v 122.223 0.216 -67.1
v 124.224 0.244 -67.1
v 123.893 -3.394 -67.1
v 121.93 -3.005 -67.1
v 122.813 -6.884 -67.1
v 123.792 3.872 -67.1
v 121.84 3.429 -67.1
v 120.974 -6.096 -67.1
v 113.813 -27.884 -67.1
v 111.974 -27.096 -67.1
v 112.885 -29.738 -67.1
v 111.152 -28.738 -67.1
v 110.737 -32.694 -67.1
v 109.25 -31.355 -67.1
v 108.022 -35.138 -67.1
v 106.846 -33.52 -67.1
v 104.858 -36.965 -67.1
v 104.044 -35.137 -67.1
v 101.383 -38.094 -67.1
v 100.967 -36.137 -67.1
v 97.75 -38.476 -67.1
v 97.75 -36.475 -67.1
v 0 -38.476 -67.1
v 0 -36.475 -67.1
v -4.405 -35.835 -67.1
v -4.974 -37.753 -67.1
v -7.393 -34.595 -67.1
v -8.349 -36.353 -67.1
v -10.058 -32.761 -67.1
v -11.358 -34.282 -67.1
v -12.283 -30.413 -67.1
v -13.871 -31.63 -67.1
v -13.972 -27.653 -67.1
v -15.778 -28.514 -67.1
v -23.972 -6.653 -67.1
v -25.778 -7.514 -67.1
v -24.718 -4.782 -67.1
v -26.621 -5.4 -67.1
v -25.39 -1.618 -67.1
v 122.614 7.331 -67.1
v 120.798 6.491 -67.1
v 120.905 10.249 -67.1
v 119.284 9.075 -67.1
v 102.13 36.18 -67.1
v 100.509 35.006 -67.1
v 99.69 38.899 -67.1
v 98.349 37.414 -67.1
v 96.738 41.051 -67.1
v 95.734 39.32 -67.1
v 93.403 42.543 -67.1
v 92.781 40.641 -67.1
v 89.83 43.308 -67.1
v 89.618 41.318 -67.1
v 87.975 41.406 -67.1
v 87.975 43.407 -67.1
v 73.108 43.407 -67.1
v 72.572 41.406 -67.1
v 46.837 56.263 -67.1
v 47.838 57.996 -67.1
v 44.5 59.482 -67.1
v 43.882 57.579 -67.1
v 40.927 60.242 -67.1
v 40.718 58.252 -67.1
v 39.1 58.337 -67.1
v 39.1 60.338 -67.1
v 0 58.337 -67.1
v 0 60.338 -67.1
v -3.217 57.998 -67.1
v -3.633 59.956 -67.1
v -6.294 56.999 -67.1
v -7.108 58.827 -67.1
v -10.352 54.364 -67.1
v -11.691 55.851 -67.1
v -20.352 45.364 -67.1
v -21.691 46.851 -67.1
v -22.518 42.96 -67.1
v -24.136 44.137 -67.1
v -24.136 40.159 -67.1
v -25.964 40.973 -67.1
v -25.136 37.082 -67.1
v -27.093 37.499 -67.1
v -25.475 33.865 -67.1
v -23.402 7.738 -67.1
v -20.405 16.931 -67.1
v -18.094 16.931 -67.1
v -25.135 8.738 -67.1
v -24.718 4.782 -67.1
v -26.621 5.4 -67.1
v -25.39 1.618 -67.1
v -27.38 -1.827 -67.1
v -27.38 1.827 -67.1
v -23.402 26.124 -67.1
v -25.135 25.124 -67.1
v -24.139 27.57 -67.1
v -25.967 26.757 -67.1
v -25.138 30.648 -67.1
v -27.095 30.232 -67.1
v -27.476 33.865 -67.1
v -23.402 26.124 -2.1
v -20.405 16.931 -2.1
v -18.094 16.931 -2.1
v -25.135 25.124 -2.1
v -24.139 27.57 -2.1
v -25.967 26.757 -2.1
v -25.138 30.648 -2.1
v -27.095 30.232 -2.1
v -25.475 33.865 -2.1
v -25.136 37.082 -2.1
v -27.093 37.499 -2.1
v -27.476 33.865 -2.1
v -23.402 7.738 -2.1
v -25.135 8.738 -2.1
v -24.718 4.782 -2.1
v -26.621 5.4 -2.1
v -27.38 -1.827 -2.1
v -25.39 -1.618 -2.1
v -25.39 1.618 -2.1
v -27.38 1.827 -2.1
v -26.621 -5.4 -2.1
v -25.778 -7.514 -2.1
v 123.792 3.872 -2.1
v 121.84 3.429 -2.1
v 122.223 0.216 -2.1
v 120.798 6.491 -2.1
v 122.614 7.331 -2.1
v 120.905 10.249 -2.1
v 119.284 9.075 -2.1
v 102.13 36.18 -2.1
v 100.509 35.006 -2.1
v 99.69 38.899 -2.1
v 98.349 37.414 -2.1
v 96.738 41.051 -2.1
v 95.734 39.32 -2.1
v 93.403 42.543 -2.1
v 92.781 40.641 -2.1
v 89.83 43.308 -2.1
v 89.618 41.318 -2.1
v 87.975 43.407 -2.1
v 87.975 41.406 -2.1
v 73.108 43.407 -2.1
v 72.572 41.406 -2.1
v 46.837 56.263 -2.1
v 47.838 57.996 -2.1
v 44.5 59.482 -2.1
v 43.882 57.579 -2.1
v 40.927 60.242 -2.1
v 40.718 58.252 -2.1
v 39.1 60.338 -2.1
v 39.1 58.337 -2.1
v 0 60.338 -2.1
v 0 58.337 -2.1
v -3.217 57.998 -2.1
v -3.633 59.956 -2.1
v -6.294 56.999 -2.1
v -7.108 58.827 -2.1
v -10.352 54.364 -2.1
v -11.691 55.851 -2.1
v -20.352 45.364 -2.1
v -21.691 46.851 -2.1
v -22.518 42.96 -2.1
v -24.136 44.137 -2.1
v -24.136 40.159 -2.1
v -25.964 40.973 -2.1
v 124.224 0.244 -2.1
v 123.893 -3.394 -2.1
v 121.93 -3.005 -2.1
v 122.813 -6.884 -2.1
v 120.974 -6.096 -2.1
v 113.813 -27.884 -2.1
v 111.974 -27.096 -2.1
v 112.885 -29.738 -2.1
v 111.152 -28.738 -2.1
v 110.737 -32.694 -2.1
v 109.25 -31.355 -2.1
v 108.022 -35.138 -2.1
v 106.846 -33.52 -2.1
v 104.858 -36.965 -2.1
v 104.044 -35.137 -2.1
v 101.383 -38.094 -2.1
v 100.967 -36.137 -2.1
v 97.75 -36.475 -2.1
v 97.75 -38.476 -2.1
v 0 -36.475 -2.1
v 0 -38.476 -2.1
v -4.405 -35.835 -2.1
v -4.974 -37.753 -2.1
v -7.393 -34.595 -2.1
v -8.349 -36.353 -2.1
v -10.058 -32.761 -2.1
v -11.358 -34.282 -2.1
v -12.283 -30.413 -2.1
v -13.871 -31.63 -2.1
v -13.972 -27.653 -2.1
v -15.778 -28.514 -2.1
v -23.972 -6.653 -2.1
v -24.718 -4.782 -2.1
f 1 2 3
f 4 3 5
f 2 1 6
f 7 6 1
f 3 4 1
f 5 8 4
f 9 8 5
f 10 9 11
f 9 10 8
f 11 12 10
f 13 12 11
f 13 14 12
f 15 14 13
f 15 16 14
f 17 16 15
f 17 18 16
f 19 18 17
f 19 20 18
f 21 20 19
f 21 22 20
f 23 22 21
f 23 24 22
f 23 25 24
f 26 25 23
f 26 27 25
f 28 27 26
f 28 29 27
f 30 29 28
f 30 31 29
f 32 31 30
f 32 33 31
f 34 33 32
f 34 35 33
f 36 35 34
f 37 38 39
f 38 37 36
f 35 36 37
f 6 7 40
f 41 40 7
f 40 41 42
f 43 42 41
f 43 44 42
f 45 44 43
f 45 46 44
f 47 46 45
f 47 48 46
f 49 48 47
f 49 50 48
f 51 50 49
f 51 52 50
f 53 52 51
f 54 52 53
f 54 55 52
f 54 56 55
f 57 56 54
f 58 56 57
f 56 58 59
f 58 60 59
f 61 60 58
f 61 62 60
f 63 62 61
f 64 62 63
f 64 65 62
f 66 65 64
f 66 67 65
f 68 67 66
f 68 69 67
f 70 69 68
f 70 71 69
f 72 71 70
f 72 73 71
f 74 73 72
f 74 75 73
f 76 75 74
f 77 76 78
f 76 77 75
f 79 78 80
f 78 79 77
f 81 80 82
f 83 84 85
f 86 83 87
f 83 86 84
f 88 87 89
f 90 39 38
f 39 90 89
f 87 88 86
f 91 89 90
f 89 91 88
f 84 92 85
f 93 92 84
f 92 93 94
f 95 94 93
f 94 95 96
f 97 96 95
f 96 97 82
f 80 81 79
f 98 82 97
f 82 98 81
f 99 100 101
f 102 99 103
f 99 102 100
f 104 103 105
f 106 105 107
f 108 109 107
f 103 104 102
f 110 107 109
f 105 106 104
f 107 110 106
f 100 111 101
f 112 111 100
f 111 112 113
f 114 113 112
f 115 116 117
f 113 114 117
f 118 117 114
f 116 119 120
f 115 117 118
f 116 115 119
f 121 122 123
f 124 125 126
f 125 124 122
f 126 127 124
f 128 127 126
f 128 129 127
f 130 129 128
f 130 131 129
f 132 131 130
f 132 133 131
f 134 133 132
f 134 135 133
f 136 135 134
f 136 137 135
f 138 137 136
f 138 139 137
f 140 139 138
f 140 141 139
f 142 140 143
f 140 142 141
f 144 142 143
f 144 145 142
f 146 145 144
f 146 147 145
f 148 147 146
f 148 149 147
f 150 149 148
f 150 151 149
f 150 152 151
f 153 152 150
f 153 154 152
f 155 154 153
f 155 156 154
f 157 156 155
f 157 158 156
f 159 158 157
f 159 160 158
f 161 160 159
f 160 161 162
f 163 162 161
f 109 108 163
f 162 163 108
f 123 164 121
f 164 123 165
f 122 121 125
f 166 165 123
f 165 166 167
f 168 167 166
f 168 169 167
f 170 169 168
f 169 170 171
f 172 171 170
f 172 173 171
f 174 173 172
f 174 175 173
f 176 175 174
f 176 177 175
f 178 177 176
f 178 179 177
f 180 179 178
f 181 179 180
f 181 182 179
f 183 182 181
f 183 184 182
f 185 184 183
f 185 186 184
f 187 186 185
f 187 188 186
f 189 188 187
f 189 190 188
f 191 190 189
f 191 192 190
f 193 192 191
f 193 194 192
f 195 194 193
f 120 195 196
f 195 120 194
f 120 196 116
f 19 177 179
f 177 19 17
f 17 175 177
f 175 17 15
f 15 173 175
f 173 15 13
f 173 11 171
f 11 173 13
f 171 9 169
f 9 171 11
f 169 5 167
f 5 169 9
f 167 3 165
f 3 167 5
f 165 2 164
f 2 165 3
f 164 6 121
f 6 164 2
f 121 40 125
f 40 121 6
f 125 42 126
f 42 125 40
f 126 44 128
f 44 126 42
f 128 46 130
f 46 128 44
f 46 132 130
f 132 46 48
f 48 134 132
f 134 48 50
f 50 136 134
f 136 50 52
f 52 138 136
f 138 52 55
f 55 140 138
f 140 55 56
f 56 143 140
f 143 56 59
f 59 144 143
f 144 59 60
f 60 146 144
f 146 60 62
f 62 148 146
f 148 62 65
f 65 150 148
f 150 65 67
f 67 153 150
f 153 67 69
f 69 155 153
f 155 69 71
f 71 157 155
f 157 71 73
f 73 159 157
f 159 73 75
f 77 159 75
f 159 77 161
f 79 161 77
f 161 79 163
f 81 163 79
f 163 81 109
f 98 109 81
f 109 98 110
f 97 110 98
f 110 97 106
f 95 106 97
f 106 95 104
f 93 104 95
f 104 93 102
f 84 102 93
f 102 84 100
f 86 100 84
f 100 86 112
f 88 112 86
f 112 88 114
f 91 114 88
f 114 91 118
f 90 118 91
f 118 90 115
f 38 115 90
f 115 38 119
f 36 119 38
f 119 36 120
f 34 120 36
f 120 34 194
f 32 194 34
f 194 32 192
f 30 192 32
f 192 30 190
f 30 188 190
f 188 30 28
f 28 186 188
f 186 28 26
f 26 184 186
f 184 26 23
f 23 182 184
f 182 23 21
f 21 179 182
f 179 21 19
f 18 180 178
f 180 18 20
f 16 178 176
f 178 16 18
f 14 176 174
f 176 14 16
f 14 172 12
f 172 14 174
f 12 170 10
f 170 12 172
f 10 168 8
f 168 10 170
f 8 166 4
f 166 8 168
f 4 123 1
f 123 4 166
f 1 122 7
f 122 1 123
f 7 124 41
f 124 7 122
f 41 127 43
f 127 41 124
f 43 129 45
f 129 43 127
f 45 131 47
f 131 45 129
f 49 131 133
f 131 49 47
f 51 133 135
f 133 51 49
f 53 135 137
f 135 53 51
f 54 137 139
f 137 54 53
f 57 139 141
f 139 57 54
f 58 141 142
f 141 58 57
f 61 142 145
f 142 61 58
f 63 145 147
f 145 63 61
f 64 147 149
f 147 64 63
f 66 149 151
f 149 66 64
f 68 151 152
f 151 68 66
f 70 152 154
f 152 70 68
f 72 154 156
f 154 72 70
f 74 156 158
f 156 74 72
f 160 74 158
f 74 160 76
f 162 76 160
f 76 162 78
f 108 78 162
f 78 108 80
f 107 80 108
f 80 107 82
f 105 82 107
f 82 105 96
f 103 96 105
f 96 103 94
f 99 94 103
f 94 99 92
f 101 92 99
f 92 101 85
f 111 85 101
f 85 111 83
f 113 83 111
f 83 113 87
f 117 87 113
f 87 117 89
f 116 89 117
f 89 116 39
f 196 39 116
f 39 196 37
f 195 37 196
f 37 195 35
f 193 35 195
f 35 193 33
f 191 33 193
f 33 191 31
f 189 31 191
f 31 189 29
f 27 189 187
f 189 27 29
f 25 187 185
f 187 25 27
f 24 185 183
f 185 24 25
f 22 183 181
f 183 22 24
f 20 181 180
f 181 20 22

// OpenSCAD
cellHeight=65;
cellDiameter=18.85;
holderHeight=7;
spacing=0.7;
stripTabHeight=1.5;
stripWidth=8;

stripDiff=0;// how small make the strip in plus side

rimThicnkess=5;
startOffset=5;//1;
rightOffset=4;//;
endOffset=4;//;
leftOffset=16;//;

coverThickness=2;
bodyThickness=2;

boltDiameter=4.5;
boltSpacingFromCell=2.4;


bmxXoffset=4;
bmsWidth=16;
bmsLength=109.5;
bmsHeight=67;
bmsSpacingFromCells=3;
bmsSenseHolesDistance=2;
makeRightHoles=true;

makeHolders=false;
makeLeftHolder=makeHolders && true;
makeRightHolder=makeHolders && false;

makeCovers=false;
makeLeftCover=makeCovers && true;
makeRightCover=makeCovers && true;

makeBody=true;
makeBMS=true;


senseHolesDiameter=4; //for sense wires


////////

s=0;
n=-1;
p=1;

trangle14s6p
    =[ 
     [p,p,p,p,p,p,p,p,p,p,p,n]
    ,[p,p,p,p,p,p,p,p,p,p,p,n,n,n]
    ,[p,n,p,p,n,p,p,n,p,n,p,n,n]
    ,[p,n,p,p,n,p,p,n,p,n,p,n,n]
    ,[p,n,n,n,n,p,p,n,n,n,n,n]
    ,[p,n,n,n,n,p,p,n,n,n,n]
    ,[n,n,n,n,n,n,n,n,n]
    ];
    
custom20s10p
=[ 
     [p,n,p,p,p,n,p,p]
    ,[p,n,p,p,p,n,p,p,n]
    ,[p,n,p,n,p,n,p,p,n]
    ,[p,n,p,n,p,n,p,p,n,n]
    ,[p,n,p,n,p,n,p,p,p,p,n,n]
    ,[p,n,p,n,p,n,p,p,p,p,n,n]
    ,[p,n,p,n,p,n,p,p,p,p,n,n]
    ,[p,n,p,n,p,n,p,p,p,p,n,n]
    ,[p,n,p,n,n,n,p,p,p,p,n,n]
    ,[p,n,p,n,n,n,p,p,p,p,n,n]
    ,[n,p,n,n,n,p,n,p,n,p,n]
    ,[n,p,n,n,n,p,n,p,n,p,n]
    ,[n,p,n,p,n,p,n,p,n,p,n]
    ,[n,p,n,p,n,p,n,p,n,n]
    ,[n,p,n,p,n,p,n,n,n,n]
    ,[n,p,n,p,n,p,n,n,n,n]    
    ,[n,p,n,p,n,p,n,n]
    ,[n,p,n,p,n,p,n]
    ,[n,p,n,p,p,p]
    ,[n,p,n,p]
    ,[n,p,p,p]
    ];

        
mine14s6p=[
         [n,p,n,p,n,p,n,p,n,p,n,p,n,p]
        ,[n,p,n,p,n,p,n,p,n,p,n,p,n,p]
        ,[n,p,n,p,n,p,n,p,n,p,n,p,n,p]
        ,[n,p,n,p,n,p,n,p,n,p,n,p,n,p]
        ,[n,p,n,p,n,p,n,p,n,p,n,p,n,p]
        ,[n,p,n,p,n,p,n,p,n,p,n,p,n,p]       
            ];        

simpleOne=[                  
         [n,n,n]
        ,[n,n,n]
        ,[n,n,n]
        ,[n,n]
        ,[n,n]
        ,[n]        
        
        ];

jacob=[ 
        [n,n,n,n,p,p,p,n,n,n,n,p,p,p,n,n,n,n,p,p]
       ,[undef,n,n,n,p,p,p,p,n,n,n,p,p,p,p,n,n,n,p,p,undef]
       ,[undef,n,n,n,n,p,p,p,n,n,n,n,p,p,p,n,n,p,p,n]
       ,[undef,undef,n,n,n,p,p,p,p,n,n,n,p,p,p,p,n,n,p,n,n]
       ,[undef,undef,n,n,n,n,p,p,p,n,n,n,n,p,p,p,n,n,p,p]
       ,[undef,undef,undef,n,n,n,p,p,p,p,n,n,n,p,p,p,p,n,p,p]
       ,[undef,undef,undef,n,n,n,n,p,p,p,n,n,n,n,p,p,p,p]
       ,[undef,undef,undef,undef,n,n,n,p,p,p,p,n,n,n,p,p,p]
       ];
manArr=simpleOne;

debug=false;


function countPolarity(manArr,d)
    =[for(x=[0:len(manArr)-1])
        for(y=[0:len(manArr[x])-1])
            if(manArr[x][y]==d) 1             
    ];


holderDiameter=cellDiameter+spacing;
stripLength=holderDiameter+0.001; 
angle=60;    
radius=holderDiameter/2;         

holderActuallHeight=holderHeight+0.002;
stripZ=holderHeight+(stripTabHeight/2);                            

outerRimHeight=holderHeight+stripTabHeight-0.001;

bodyHeight=cellHeight;
rimOffset=radius+spacing +rimThicnkess;// from where to drawe holer's rim
actuallBodyThickness=rimOffset+0.001+bodyThickness;



negatives=len(countPolarity(manArr,n));
positives=len(countPolarity(manArr,p));
total=negatives+positives;


group=6; 
            
echo("**********");
echo("Negatives",negatives," Positives",positives,"Total :",total,"Serial: ",total/group ,"Group: " ,group);
echo("**********");
echo("");

    
start=[for(x=[0:len(manArr[0])-1])
    [0,x]
];
echo("start",start);

right=[for(x=[0:len(manArr)-1])
    if(len(manArr[x])-1 >0) [x,len(manArr[x])-1]
];
echo ("right",right);

end=[for(x=[len(manArr[len(manArr)-1])-1:-1:0])
    [len(manArr)-1,x]  
];
echo ("end",end);

left =[for(x=[len(manArr)-1:-1:0])
   [x,0]
];
echo ("left",left);


function startOutline()
    =[for(i=start) calc2D(i,-rimThicnkess- startOffset,0)];
        
function rightOutline()
  = [for(i=right) calc2D(i,0,rimThicnkess+ rightOffset)]  ;
      
function endOutline()
    =[for(i=end)  calc2D(i,rimThicnkess+ endOffset,0)] ;
        
function leftOutline()
    =[for(i=left) calc2D(i,0,-rimThicnkess-leftOffset)];    
        
function createOutline()
    =concat( startOutline()
            ,rightOutline()
            ,endOutline()
            ,leftOutline());


difference(){
    union(){       
            translate([0,0,coverThickness]){
                if (makeRightCover){         
                    makeCover(false);
                }
            }
            translate([0,0,-coverThickness-outerRimHeight-0.1]){
                 if (makeRightHolder){ 
                    drawHolder(false);
                 }
            }
            translate([0,0,-coverThickness-bodyHeight-0.1]){
                //, [0.775, 53.7924] ,[-10, 31.8616],[0, 14.9308] ,[-9, -0]
                if (makeBody){     
                        starOutline=concat([
                     [-5, 0],           [4.775, 16.9308], [-5, 33.8616], [4.775, 50.7924]
                    ,[1,53]
                    
                    
                    ]
                    );
                        
                        echo(starOutline);
                    difference(){       
                        /*
                        translate([0,0,0]){
                          //  drawOutline(startOutline(),bodyHeight-outerRimHeight,rimOffset/4)     ;
                           # linear_extrude(bodyHeight-outerRimHeight){
                                
                                        polygon(starOutline);
                                
                            } 
                        }*/
                        drawRim(bodyHeight,actuallBodyThickness);                                            
                        translate([0,0,-0.001]){                                
                            drawRim(bodyHeight+0.01,rimOffset);                    
                        }             
                    }                    
                } 
                 
            }
            translate([0,0,-coverThickness-bodyHeight+outerRimHeight]){
                mirror([0,0,90]){
                     if (makeLeftHolder){                   
                        drawHolder(true);
                     }
                }
            }
            translate([0,0,-coverThickness-coverThickness-bodyHeight-outerRimHeight]){
                if (makeLeftCover){
                    makeCover(makeBody);
                }
            }
        
    }
    
    if (makeBMS){
            startPos=start[0];         
            coord=calc2D(startPos);                        
            bmsX=coord[0]-radius+spacing+bmxXoffset;
            bmsY=coord[1]-radius-bmsWidth-spacing;    
            
            translate([bmsX,bmsY-bmsSpacingFromCells,-coverThickness-bmsHeight]){            
               cube([bmsLength,bmsWidth,bmsHeight]);
            }
    }   
  
}
 
      

module drawHolder(leftSide=true){
     difference(){
   
        drawRim(outerRimHeight,rimOffset);  
                       
        for(a=[0:len(start)-1]){//draw sense wires holes                                
            isOuter= (a %2)==0;
            if (isOuter){
                coord=calc2D(start[a]);                

                translate([coord[0]-radius-(senseHolesDiameter/1.6),coord[1],-0.001]){                
                    cylinder(d=senseHolesDiameter,h=holderActuallHeight+ stripTabHeight);                                               
                    translate([0,0,stripZ]){
                        cube([senseHolesDiameter+1.6,senseHolesDiameter,stripTabHeight+0.001],center=true);                             
                    }
                }                                    
            }
        }           
                 for(a=[1:len(left)-1]){//left sense wires
                      isInner= (a %2)==1;
                     
                          coord=calc2D(left[a]);                        
                          translate([coord[0]+radius,coord[1]-(senseHolesDiameter*2)-bmsSenseHolesDistance,-0.001]){                
                            cylinder(d=senseHolesDiameter,h=holderActuallHeight+stripTabHeight);                      
                              
                            translate([0,(-bmsSpacingFromCells/2)+bmsSenseHolesDistance+0.0001,stripZ]){
                               cube([senseHolesDiameter*2,(senseHolesDiameter*2)+bmsSpacingFromCells,stripTabHeight+0.001],center=true);                             
                            }
                        }  
                    
                 } 
        drawAllBoltHoles();
        drawHoles(manArr,leftSide);
      
    }
}
module drawAllBoltHoles(){
        drawBoltHoles(start,1);
        if (makeRightHoles){
            arrEdge=right;
            isInnerPrm=1;
            spaceFactor=-1;   
            for(a=[0:len(arrEdge)-1]){// draw right bolt diameter                     
                coord=calc2D(arrEdge[a]);          
                //+spaceFactor*(radius+(boltDiameter/2)+(boltSpacingFromCell/2));
                yFactor=((radius+boltSpacingFromCell)+0.5);
                boltX=coord[0]+  (sin(60)*(yFactor));
                boltY=coord[1]+yFactor;//-spaceFactor*(radius+(boltDiameter/2)+boltSpacingFromCell);
                translate([boltX,boltY,-0.001]){
                  #cylinder(d=boltDiameter,h=holderActuallHeight+ stripTabHeight+coverThickness);
                }          
              }
            }
        drawBoltHoles(end,-1);
}

module drawBoltHoles(arrEdge,spaceFactor){
     for(a=[0:len(arrEdge)-1]){   
        points= arrEdge[a];
         
        coord=calc2D(points);         
        isInner= (a%2)==0;                    
        if (isInner){
            echo(points,coord);
            //+spaceFactor*(radius+(boltDiameter/2)+boltSpacingFromCell);
            xFactor=spaceFactor*((radius+boltSpacingFromCell)+0.5);
            boltX=coord[0]-xFactor;
            boltY=coord[1]+spaceFactor*((sin(60)*xFactor));
            translate([boltX,boltY,-0.001]){
                #cylinder(d=boltDiameter,h=holderActuallHeight+ stripTabHeight+coverThickness);
            }        
        }
      }
}

module makeCover(withBody=false){
   difference(){   
        drawRim(coverThickness,actuallBodyThickness);                                          
        drawAllBoltHoles();         
    }
    /*
    if (withBody){
        
        difference(){
            drawRim(bodyHeight,actuallBodyThickness);                                            
            translate([0,0,-0.001]){                                
                drawRim(bodyHeight+0.01,rimOffset);                    
            }        
        }
    }*/
}

    
module drawRim(rimHeight,rOffset){
    drawOutline(createOutline(),rimHeight,rOffset);    
}
module drawOutline(outline,rimHeight,rOffset){
    if (!debug){
        linear_extrude(rimHeight){
            offset(r=rOffset){                
                polygon(outline);
            }
        }      
    }
}
module drawHoles(manArr,left=true){
    for(c=[0:len(manArr)-1]){
         col= manArr[c];
         for(r=[0:len(col)-1]){
             cell=col[r];
             drawCell([c,r],cell,left);               
         }     
    }  
}
function calc2D(coord,xOffset=0,yOffset=0)
    =[ ((radius*(coord[1]%2))+(coord[0]*holderDiameter))+xOffset
       ,(sin(angle)*holderDiameter*coord[1])+yOffset ];


module drawCell(pos,cell,left=true){
       
    col=pos[0];
    row=pos[1];              
    
    position=concat(calc2D(pos),0);
    x=position[0];
    y=position[1];
    z=position[2];
    positiveCell=cell==p;
    negativeCell=cell==n;
    drawNegative=stripDiff!=0 && (negativeCell && left || positiveCell && !left  );
    
    holderZ=z-0.001; 
    actuallstripWidth= stripWidth+ (drawNegative ?0:stripDiff);
    if(negativeCell || positiveCell){
        translate([x,y,z]){
            
            translate([0,0,stripZ]){               
               actuallstripWidth= stripWidth+ (drawNegative ?0:stripDiff);
               cube([stripLength,actuallstripWidth,stripTabHeight],center=true);
                
               rotate(angle){
                    cube([stripLength,actuallstripWidth,stripTabHeight],center=true);
               }
               
               rotate(angle*2){
                    cube([stripLength,actuallstripWidth,stripTabHeight],center=true);
               }
            }           
        }
        
        translate([x,y,holderZ]){       
            clr=drawNegative ? "black" :"red";
            color(clr){
                translate([0,0,-cellHeight+holderActuallHeight]){
                    cylinder(d=cellDiameter,h=cellHeight);
                }              
                rotate([0,0,90]){
                    #text(str(col,",",row),size=4);                   
                }               
            }
        }       
    }
        
}    
    
